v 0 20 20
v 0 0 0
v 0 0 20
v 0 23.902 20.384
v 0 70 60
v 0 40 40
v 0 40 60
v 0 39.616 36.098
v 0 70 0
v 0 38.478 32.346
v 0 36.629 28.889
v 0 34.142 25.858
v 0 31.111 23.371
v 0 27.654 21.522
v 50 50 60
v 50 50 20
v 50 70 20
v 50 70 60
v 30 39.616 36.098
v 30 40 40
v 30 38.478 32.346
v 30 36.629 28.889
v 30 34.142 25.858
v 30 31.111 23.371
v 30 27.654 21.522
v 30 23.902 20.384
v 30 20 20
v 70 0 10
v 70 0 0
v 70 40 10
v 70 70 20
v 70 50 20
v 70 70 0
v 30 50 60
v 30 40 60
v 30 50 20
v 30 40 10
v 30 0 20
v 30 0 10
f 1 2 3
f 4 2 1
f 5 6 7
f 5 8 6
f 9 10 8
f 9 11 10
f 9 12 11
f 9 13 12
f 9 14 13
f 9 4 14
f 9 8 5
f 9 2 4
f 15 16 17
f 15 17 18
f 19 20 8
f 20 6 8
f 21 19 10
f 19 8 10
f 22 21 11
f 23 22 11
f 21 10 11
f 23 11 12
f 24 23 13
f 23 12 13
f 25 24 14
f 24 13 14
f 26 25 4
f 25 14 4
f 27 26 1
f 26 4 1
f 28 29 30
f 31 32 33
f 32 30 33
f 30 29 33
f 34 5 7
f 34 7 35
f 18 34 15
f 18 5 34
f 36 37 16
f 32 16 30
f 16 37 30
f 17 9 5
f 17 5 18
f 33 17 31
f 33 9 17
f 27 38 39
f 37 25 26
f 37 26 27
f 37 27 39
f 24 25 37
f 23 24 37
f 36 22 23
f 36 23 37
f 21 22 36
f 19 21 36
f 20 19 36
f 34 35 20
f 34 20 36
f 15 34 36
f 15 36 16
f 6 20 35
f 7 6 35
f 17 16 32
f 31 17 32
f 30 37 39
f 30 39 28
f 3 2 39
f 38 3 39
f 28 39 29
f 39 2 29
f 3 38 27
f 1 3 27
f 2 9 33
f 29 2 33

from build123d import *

# Parameters (mm, degrees)
F0_W     = 70
F0_H     = 70
F1_DEPTH = 60
F2_W     = 40
F2_H     = 50
F3_DEPTH = 50
F4_W     = 20
F4_H     = 40
F5_DEPTH = 20
F6_W     = 40
F6_H     = 40
F7_DEPTH = 30
F8_R     = 20
F9_SIZE  = 10


with BuildPart() as f1:
    # F0 (on Top) → F1 (new body)
    with BuildSketch(Plane.XY):
        with Locations((35, 35)):
            Rectangle(F0_W, F0_H)
    extrude(amount=F1_DEPTH)

    # F2 (on face) → F3 (cut)
    with BuildSketch(Plane.XY.offset(60)):
        with Locations((50, 25)):
            Rectangle(F2_W, F2_H)
    extrude(amount=-F3_DEPTH, mode=Mode.SUBTRACT)

    # F4 (on face) → F5 (cut)
    with BuildSketch(Plane.XZ.offset(-50)):
        with Locations((60, 40)):
            Rectangle(F4_W, F4_H)
    extrude(amount=-F5_DEPTH, mode=Mode.SUBTRACT)

    # F6 (on face) → F7 (cut)
    with BuildSketch(Plane.YZ.offset(30)):
        with Locations((20, 40)):
            Rectangle(F6_W, F6_H)
    extrude(amount=-F7_DEPTH, mode=Mode.SUBTRACT)

    # F8
    f8_edges = [f1.edges().sort_by_distance(p)[0] for p in [
        (15, 40, 20),
    ]]
    fillet(f8_edges, radius=F8_R)

    # F9
    f9_edges = [f1.edges().sort_by_distance(p)[0] for p in [
        (50, 50, 10),
    ]]
    chamfer(f9_edges, length=F9_SIZE)


solid = f1.part
